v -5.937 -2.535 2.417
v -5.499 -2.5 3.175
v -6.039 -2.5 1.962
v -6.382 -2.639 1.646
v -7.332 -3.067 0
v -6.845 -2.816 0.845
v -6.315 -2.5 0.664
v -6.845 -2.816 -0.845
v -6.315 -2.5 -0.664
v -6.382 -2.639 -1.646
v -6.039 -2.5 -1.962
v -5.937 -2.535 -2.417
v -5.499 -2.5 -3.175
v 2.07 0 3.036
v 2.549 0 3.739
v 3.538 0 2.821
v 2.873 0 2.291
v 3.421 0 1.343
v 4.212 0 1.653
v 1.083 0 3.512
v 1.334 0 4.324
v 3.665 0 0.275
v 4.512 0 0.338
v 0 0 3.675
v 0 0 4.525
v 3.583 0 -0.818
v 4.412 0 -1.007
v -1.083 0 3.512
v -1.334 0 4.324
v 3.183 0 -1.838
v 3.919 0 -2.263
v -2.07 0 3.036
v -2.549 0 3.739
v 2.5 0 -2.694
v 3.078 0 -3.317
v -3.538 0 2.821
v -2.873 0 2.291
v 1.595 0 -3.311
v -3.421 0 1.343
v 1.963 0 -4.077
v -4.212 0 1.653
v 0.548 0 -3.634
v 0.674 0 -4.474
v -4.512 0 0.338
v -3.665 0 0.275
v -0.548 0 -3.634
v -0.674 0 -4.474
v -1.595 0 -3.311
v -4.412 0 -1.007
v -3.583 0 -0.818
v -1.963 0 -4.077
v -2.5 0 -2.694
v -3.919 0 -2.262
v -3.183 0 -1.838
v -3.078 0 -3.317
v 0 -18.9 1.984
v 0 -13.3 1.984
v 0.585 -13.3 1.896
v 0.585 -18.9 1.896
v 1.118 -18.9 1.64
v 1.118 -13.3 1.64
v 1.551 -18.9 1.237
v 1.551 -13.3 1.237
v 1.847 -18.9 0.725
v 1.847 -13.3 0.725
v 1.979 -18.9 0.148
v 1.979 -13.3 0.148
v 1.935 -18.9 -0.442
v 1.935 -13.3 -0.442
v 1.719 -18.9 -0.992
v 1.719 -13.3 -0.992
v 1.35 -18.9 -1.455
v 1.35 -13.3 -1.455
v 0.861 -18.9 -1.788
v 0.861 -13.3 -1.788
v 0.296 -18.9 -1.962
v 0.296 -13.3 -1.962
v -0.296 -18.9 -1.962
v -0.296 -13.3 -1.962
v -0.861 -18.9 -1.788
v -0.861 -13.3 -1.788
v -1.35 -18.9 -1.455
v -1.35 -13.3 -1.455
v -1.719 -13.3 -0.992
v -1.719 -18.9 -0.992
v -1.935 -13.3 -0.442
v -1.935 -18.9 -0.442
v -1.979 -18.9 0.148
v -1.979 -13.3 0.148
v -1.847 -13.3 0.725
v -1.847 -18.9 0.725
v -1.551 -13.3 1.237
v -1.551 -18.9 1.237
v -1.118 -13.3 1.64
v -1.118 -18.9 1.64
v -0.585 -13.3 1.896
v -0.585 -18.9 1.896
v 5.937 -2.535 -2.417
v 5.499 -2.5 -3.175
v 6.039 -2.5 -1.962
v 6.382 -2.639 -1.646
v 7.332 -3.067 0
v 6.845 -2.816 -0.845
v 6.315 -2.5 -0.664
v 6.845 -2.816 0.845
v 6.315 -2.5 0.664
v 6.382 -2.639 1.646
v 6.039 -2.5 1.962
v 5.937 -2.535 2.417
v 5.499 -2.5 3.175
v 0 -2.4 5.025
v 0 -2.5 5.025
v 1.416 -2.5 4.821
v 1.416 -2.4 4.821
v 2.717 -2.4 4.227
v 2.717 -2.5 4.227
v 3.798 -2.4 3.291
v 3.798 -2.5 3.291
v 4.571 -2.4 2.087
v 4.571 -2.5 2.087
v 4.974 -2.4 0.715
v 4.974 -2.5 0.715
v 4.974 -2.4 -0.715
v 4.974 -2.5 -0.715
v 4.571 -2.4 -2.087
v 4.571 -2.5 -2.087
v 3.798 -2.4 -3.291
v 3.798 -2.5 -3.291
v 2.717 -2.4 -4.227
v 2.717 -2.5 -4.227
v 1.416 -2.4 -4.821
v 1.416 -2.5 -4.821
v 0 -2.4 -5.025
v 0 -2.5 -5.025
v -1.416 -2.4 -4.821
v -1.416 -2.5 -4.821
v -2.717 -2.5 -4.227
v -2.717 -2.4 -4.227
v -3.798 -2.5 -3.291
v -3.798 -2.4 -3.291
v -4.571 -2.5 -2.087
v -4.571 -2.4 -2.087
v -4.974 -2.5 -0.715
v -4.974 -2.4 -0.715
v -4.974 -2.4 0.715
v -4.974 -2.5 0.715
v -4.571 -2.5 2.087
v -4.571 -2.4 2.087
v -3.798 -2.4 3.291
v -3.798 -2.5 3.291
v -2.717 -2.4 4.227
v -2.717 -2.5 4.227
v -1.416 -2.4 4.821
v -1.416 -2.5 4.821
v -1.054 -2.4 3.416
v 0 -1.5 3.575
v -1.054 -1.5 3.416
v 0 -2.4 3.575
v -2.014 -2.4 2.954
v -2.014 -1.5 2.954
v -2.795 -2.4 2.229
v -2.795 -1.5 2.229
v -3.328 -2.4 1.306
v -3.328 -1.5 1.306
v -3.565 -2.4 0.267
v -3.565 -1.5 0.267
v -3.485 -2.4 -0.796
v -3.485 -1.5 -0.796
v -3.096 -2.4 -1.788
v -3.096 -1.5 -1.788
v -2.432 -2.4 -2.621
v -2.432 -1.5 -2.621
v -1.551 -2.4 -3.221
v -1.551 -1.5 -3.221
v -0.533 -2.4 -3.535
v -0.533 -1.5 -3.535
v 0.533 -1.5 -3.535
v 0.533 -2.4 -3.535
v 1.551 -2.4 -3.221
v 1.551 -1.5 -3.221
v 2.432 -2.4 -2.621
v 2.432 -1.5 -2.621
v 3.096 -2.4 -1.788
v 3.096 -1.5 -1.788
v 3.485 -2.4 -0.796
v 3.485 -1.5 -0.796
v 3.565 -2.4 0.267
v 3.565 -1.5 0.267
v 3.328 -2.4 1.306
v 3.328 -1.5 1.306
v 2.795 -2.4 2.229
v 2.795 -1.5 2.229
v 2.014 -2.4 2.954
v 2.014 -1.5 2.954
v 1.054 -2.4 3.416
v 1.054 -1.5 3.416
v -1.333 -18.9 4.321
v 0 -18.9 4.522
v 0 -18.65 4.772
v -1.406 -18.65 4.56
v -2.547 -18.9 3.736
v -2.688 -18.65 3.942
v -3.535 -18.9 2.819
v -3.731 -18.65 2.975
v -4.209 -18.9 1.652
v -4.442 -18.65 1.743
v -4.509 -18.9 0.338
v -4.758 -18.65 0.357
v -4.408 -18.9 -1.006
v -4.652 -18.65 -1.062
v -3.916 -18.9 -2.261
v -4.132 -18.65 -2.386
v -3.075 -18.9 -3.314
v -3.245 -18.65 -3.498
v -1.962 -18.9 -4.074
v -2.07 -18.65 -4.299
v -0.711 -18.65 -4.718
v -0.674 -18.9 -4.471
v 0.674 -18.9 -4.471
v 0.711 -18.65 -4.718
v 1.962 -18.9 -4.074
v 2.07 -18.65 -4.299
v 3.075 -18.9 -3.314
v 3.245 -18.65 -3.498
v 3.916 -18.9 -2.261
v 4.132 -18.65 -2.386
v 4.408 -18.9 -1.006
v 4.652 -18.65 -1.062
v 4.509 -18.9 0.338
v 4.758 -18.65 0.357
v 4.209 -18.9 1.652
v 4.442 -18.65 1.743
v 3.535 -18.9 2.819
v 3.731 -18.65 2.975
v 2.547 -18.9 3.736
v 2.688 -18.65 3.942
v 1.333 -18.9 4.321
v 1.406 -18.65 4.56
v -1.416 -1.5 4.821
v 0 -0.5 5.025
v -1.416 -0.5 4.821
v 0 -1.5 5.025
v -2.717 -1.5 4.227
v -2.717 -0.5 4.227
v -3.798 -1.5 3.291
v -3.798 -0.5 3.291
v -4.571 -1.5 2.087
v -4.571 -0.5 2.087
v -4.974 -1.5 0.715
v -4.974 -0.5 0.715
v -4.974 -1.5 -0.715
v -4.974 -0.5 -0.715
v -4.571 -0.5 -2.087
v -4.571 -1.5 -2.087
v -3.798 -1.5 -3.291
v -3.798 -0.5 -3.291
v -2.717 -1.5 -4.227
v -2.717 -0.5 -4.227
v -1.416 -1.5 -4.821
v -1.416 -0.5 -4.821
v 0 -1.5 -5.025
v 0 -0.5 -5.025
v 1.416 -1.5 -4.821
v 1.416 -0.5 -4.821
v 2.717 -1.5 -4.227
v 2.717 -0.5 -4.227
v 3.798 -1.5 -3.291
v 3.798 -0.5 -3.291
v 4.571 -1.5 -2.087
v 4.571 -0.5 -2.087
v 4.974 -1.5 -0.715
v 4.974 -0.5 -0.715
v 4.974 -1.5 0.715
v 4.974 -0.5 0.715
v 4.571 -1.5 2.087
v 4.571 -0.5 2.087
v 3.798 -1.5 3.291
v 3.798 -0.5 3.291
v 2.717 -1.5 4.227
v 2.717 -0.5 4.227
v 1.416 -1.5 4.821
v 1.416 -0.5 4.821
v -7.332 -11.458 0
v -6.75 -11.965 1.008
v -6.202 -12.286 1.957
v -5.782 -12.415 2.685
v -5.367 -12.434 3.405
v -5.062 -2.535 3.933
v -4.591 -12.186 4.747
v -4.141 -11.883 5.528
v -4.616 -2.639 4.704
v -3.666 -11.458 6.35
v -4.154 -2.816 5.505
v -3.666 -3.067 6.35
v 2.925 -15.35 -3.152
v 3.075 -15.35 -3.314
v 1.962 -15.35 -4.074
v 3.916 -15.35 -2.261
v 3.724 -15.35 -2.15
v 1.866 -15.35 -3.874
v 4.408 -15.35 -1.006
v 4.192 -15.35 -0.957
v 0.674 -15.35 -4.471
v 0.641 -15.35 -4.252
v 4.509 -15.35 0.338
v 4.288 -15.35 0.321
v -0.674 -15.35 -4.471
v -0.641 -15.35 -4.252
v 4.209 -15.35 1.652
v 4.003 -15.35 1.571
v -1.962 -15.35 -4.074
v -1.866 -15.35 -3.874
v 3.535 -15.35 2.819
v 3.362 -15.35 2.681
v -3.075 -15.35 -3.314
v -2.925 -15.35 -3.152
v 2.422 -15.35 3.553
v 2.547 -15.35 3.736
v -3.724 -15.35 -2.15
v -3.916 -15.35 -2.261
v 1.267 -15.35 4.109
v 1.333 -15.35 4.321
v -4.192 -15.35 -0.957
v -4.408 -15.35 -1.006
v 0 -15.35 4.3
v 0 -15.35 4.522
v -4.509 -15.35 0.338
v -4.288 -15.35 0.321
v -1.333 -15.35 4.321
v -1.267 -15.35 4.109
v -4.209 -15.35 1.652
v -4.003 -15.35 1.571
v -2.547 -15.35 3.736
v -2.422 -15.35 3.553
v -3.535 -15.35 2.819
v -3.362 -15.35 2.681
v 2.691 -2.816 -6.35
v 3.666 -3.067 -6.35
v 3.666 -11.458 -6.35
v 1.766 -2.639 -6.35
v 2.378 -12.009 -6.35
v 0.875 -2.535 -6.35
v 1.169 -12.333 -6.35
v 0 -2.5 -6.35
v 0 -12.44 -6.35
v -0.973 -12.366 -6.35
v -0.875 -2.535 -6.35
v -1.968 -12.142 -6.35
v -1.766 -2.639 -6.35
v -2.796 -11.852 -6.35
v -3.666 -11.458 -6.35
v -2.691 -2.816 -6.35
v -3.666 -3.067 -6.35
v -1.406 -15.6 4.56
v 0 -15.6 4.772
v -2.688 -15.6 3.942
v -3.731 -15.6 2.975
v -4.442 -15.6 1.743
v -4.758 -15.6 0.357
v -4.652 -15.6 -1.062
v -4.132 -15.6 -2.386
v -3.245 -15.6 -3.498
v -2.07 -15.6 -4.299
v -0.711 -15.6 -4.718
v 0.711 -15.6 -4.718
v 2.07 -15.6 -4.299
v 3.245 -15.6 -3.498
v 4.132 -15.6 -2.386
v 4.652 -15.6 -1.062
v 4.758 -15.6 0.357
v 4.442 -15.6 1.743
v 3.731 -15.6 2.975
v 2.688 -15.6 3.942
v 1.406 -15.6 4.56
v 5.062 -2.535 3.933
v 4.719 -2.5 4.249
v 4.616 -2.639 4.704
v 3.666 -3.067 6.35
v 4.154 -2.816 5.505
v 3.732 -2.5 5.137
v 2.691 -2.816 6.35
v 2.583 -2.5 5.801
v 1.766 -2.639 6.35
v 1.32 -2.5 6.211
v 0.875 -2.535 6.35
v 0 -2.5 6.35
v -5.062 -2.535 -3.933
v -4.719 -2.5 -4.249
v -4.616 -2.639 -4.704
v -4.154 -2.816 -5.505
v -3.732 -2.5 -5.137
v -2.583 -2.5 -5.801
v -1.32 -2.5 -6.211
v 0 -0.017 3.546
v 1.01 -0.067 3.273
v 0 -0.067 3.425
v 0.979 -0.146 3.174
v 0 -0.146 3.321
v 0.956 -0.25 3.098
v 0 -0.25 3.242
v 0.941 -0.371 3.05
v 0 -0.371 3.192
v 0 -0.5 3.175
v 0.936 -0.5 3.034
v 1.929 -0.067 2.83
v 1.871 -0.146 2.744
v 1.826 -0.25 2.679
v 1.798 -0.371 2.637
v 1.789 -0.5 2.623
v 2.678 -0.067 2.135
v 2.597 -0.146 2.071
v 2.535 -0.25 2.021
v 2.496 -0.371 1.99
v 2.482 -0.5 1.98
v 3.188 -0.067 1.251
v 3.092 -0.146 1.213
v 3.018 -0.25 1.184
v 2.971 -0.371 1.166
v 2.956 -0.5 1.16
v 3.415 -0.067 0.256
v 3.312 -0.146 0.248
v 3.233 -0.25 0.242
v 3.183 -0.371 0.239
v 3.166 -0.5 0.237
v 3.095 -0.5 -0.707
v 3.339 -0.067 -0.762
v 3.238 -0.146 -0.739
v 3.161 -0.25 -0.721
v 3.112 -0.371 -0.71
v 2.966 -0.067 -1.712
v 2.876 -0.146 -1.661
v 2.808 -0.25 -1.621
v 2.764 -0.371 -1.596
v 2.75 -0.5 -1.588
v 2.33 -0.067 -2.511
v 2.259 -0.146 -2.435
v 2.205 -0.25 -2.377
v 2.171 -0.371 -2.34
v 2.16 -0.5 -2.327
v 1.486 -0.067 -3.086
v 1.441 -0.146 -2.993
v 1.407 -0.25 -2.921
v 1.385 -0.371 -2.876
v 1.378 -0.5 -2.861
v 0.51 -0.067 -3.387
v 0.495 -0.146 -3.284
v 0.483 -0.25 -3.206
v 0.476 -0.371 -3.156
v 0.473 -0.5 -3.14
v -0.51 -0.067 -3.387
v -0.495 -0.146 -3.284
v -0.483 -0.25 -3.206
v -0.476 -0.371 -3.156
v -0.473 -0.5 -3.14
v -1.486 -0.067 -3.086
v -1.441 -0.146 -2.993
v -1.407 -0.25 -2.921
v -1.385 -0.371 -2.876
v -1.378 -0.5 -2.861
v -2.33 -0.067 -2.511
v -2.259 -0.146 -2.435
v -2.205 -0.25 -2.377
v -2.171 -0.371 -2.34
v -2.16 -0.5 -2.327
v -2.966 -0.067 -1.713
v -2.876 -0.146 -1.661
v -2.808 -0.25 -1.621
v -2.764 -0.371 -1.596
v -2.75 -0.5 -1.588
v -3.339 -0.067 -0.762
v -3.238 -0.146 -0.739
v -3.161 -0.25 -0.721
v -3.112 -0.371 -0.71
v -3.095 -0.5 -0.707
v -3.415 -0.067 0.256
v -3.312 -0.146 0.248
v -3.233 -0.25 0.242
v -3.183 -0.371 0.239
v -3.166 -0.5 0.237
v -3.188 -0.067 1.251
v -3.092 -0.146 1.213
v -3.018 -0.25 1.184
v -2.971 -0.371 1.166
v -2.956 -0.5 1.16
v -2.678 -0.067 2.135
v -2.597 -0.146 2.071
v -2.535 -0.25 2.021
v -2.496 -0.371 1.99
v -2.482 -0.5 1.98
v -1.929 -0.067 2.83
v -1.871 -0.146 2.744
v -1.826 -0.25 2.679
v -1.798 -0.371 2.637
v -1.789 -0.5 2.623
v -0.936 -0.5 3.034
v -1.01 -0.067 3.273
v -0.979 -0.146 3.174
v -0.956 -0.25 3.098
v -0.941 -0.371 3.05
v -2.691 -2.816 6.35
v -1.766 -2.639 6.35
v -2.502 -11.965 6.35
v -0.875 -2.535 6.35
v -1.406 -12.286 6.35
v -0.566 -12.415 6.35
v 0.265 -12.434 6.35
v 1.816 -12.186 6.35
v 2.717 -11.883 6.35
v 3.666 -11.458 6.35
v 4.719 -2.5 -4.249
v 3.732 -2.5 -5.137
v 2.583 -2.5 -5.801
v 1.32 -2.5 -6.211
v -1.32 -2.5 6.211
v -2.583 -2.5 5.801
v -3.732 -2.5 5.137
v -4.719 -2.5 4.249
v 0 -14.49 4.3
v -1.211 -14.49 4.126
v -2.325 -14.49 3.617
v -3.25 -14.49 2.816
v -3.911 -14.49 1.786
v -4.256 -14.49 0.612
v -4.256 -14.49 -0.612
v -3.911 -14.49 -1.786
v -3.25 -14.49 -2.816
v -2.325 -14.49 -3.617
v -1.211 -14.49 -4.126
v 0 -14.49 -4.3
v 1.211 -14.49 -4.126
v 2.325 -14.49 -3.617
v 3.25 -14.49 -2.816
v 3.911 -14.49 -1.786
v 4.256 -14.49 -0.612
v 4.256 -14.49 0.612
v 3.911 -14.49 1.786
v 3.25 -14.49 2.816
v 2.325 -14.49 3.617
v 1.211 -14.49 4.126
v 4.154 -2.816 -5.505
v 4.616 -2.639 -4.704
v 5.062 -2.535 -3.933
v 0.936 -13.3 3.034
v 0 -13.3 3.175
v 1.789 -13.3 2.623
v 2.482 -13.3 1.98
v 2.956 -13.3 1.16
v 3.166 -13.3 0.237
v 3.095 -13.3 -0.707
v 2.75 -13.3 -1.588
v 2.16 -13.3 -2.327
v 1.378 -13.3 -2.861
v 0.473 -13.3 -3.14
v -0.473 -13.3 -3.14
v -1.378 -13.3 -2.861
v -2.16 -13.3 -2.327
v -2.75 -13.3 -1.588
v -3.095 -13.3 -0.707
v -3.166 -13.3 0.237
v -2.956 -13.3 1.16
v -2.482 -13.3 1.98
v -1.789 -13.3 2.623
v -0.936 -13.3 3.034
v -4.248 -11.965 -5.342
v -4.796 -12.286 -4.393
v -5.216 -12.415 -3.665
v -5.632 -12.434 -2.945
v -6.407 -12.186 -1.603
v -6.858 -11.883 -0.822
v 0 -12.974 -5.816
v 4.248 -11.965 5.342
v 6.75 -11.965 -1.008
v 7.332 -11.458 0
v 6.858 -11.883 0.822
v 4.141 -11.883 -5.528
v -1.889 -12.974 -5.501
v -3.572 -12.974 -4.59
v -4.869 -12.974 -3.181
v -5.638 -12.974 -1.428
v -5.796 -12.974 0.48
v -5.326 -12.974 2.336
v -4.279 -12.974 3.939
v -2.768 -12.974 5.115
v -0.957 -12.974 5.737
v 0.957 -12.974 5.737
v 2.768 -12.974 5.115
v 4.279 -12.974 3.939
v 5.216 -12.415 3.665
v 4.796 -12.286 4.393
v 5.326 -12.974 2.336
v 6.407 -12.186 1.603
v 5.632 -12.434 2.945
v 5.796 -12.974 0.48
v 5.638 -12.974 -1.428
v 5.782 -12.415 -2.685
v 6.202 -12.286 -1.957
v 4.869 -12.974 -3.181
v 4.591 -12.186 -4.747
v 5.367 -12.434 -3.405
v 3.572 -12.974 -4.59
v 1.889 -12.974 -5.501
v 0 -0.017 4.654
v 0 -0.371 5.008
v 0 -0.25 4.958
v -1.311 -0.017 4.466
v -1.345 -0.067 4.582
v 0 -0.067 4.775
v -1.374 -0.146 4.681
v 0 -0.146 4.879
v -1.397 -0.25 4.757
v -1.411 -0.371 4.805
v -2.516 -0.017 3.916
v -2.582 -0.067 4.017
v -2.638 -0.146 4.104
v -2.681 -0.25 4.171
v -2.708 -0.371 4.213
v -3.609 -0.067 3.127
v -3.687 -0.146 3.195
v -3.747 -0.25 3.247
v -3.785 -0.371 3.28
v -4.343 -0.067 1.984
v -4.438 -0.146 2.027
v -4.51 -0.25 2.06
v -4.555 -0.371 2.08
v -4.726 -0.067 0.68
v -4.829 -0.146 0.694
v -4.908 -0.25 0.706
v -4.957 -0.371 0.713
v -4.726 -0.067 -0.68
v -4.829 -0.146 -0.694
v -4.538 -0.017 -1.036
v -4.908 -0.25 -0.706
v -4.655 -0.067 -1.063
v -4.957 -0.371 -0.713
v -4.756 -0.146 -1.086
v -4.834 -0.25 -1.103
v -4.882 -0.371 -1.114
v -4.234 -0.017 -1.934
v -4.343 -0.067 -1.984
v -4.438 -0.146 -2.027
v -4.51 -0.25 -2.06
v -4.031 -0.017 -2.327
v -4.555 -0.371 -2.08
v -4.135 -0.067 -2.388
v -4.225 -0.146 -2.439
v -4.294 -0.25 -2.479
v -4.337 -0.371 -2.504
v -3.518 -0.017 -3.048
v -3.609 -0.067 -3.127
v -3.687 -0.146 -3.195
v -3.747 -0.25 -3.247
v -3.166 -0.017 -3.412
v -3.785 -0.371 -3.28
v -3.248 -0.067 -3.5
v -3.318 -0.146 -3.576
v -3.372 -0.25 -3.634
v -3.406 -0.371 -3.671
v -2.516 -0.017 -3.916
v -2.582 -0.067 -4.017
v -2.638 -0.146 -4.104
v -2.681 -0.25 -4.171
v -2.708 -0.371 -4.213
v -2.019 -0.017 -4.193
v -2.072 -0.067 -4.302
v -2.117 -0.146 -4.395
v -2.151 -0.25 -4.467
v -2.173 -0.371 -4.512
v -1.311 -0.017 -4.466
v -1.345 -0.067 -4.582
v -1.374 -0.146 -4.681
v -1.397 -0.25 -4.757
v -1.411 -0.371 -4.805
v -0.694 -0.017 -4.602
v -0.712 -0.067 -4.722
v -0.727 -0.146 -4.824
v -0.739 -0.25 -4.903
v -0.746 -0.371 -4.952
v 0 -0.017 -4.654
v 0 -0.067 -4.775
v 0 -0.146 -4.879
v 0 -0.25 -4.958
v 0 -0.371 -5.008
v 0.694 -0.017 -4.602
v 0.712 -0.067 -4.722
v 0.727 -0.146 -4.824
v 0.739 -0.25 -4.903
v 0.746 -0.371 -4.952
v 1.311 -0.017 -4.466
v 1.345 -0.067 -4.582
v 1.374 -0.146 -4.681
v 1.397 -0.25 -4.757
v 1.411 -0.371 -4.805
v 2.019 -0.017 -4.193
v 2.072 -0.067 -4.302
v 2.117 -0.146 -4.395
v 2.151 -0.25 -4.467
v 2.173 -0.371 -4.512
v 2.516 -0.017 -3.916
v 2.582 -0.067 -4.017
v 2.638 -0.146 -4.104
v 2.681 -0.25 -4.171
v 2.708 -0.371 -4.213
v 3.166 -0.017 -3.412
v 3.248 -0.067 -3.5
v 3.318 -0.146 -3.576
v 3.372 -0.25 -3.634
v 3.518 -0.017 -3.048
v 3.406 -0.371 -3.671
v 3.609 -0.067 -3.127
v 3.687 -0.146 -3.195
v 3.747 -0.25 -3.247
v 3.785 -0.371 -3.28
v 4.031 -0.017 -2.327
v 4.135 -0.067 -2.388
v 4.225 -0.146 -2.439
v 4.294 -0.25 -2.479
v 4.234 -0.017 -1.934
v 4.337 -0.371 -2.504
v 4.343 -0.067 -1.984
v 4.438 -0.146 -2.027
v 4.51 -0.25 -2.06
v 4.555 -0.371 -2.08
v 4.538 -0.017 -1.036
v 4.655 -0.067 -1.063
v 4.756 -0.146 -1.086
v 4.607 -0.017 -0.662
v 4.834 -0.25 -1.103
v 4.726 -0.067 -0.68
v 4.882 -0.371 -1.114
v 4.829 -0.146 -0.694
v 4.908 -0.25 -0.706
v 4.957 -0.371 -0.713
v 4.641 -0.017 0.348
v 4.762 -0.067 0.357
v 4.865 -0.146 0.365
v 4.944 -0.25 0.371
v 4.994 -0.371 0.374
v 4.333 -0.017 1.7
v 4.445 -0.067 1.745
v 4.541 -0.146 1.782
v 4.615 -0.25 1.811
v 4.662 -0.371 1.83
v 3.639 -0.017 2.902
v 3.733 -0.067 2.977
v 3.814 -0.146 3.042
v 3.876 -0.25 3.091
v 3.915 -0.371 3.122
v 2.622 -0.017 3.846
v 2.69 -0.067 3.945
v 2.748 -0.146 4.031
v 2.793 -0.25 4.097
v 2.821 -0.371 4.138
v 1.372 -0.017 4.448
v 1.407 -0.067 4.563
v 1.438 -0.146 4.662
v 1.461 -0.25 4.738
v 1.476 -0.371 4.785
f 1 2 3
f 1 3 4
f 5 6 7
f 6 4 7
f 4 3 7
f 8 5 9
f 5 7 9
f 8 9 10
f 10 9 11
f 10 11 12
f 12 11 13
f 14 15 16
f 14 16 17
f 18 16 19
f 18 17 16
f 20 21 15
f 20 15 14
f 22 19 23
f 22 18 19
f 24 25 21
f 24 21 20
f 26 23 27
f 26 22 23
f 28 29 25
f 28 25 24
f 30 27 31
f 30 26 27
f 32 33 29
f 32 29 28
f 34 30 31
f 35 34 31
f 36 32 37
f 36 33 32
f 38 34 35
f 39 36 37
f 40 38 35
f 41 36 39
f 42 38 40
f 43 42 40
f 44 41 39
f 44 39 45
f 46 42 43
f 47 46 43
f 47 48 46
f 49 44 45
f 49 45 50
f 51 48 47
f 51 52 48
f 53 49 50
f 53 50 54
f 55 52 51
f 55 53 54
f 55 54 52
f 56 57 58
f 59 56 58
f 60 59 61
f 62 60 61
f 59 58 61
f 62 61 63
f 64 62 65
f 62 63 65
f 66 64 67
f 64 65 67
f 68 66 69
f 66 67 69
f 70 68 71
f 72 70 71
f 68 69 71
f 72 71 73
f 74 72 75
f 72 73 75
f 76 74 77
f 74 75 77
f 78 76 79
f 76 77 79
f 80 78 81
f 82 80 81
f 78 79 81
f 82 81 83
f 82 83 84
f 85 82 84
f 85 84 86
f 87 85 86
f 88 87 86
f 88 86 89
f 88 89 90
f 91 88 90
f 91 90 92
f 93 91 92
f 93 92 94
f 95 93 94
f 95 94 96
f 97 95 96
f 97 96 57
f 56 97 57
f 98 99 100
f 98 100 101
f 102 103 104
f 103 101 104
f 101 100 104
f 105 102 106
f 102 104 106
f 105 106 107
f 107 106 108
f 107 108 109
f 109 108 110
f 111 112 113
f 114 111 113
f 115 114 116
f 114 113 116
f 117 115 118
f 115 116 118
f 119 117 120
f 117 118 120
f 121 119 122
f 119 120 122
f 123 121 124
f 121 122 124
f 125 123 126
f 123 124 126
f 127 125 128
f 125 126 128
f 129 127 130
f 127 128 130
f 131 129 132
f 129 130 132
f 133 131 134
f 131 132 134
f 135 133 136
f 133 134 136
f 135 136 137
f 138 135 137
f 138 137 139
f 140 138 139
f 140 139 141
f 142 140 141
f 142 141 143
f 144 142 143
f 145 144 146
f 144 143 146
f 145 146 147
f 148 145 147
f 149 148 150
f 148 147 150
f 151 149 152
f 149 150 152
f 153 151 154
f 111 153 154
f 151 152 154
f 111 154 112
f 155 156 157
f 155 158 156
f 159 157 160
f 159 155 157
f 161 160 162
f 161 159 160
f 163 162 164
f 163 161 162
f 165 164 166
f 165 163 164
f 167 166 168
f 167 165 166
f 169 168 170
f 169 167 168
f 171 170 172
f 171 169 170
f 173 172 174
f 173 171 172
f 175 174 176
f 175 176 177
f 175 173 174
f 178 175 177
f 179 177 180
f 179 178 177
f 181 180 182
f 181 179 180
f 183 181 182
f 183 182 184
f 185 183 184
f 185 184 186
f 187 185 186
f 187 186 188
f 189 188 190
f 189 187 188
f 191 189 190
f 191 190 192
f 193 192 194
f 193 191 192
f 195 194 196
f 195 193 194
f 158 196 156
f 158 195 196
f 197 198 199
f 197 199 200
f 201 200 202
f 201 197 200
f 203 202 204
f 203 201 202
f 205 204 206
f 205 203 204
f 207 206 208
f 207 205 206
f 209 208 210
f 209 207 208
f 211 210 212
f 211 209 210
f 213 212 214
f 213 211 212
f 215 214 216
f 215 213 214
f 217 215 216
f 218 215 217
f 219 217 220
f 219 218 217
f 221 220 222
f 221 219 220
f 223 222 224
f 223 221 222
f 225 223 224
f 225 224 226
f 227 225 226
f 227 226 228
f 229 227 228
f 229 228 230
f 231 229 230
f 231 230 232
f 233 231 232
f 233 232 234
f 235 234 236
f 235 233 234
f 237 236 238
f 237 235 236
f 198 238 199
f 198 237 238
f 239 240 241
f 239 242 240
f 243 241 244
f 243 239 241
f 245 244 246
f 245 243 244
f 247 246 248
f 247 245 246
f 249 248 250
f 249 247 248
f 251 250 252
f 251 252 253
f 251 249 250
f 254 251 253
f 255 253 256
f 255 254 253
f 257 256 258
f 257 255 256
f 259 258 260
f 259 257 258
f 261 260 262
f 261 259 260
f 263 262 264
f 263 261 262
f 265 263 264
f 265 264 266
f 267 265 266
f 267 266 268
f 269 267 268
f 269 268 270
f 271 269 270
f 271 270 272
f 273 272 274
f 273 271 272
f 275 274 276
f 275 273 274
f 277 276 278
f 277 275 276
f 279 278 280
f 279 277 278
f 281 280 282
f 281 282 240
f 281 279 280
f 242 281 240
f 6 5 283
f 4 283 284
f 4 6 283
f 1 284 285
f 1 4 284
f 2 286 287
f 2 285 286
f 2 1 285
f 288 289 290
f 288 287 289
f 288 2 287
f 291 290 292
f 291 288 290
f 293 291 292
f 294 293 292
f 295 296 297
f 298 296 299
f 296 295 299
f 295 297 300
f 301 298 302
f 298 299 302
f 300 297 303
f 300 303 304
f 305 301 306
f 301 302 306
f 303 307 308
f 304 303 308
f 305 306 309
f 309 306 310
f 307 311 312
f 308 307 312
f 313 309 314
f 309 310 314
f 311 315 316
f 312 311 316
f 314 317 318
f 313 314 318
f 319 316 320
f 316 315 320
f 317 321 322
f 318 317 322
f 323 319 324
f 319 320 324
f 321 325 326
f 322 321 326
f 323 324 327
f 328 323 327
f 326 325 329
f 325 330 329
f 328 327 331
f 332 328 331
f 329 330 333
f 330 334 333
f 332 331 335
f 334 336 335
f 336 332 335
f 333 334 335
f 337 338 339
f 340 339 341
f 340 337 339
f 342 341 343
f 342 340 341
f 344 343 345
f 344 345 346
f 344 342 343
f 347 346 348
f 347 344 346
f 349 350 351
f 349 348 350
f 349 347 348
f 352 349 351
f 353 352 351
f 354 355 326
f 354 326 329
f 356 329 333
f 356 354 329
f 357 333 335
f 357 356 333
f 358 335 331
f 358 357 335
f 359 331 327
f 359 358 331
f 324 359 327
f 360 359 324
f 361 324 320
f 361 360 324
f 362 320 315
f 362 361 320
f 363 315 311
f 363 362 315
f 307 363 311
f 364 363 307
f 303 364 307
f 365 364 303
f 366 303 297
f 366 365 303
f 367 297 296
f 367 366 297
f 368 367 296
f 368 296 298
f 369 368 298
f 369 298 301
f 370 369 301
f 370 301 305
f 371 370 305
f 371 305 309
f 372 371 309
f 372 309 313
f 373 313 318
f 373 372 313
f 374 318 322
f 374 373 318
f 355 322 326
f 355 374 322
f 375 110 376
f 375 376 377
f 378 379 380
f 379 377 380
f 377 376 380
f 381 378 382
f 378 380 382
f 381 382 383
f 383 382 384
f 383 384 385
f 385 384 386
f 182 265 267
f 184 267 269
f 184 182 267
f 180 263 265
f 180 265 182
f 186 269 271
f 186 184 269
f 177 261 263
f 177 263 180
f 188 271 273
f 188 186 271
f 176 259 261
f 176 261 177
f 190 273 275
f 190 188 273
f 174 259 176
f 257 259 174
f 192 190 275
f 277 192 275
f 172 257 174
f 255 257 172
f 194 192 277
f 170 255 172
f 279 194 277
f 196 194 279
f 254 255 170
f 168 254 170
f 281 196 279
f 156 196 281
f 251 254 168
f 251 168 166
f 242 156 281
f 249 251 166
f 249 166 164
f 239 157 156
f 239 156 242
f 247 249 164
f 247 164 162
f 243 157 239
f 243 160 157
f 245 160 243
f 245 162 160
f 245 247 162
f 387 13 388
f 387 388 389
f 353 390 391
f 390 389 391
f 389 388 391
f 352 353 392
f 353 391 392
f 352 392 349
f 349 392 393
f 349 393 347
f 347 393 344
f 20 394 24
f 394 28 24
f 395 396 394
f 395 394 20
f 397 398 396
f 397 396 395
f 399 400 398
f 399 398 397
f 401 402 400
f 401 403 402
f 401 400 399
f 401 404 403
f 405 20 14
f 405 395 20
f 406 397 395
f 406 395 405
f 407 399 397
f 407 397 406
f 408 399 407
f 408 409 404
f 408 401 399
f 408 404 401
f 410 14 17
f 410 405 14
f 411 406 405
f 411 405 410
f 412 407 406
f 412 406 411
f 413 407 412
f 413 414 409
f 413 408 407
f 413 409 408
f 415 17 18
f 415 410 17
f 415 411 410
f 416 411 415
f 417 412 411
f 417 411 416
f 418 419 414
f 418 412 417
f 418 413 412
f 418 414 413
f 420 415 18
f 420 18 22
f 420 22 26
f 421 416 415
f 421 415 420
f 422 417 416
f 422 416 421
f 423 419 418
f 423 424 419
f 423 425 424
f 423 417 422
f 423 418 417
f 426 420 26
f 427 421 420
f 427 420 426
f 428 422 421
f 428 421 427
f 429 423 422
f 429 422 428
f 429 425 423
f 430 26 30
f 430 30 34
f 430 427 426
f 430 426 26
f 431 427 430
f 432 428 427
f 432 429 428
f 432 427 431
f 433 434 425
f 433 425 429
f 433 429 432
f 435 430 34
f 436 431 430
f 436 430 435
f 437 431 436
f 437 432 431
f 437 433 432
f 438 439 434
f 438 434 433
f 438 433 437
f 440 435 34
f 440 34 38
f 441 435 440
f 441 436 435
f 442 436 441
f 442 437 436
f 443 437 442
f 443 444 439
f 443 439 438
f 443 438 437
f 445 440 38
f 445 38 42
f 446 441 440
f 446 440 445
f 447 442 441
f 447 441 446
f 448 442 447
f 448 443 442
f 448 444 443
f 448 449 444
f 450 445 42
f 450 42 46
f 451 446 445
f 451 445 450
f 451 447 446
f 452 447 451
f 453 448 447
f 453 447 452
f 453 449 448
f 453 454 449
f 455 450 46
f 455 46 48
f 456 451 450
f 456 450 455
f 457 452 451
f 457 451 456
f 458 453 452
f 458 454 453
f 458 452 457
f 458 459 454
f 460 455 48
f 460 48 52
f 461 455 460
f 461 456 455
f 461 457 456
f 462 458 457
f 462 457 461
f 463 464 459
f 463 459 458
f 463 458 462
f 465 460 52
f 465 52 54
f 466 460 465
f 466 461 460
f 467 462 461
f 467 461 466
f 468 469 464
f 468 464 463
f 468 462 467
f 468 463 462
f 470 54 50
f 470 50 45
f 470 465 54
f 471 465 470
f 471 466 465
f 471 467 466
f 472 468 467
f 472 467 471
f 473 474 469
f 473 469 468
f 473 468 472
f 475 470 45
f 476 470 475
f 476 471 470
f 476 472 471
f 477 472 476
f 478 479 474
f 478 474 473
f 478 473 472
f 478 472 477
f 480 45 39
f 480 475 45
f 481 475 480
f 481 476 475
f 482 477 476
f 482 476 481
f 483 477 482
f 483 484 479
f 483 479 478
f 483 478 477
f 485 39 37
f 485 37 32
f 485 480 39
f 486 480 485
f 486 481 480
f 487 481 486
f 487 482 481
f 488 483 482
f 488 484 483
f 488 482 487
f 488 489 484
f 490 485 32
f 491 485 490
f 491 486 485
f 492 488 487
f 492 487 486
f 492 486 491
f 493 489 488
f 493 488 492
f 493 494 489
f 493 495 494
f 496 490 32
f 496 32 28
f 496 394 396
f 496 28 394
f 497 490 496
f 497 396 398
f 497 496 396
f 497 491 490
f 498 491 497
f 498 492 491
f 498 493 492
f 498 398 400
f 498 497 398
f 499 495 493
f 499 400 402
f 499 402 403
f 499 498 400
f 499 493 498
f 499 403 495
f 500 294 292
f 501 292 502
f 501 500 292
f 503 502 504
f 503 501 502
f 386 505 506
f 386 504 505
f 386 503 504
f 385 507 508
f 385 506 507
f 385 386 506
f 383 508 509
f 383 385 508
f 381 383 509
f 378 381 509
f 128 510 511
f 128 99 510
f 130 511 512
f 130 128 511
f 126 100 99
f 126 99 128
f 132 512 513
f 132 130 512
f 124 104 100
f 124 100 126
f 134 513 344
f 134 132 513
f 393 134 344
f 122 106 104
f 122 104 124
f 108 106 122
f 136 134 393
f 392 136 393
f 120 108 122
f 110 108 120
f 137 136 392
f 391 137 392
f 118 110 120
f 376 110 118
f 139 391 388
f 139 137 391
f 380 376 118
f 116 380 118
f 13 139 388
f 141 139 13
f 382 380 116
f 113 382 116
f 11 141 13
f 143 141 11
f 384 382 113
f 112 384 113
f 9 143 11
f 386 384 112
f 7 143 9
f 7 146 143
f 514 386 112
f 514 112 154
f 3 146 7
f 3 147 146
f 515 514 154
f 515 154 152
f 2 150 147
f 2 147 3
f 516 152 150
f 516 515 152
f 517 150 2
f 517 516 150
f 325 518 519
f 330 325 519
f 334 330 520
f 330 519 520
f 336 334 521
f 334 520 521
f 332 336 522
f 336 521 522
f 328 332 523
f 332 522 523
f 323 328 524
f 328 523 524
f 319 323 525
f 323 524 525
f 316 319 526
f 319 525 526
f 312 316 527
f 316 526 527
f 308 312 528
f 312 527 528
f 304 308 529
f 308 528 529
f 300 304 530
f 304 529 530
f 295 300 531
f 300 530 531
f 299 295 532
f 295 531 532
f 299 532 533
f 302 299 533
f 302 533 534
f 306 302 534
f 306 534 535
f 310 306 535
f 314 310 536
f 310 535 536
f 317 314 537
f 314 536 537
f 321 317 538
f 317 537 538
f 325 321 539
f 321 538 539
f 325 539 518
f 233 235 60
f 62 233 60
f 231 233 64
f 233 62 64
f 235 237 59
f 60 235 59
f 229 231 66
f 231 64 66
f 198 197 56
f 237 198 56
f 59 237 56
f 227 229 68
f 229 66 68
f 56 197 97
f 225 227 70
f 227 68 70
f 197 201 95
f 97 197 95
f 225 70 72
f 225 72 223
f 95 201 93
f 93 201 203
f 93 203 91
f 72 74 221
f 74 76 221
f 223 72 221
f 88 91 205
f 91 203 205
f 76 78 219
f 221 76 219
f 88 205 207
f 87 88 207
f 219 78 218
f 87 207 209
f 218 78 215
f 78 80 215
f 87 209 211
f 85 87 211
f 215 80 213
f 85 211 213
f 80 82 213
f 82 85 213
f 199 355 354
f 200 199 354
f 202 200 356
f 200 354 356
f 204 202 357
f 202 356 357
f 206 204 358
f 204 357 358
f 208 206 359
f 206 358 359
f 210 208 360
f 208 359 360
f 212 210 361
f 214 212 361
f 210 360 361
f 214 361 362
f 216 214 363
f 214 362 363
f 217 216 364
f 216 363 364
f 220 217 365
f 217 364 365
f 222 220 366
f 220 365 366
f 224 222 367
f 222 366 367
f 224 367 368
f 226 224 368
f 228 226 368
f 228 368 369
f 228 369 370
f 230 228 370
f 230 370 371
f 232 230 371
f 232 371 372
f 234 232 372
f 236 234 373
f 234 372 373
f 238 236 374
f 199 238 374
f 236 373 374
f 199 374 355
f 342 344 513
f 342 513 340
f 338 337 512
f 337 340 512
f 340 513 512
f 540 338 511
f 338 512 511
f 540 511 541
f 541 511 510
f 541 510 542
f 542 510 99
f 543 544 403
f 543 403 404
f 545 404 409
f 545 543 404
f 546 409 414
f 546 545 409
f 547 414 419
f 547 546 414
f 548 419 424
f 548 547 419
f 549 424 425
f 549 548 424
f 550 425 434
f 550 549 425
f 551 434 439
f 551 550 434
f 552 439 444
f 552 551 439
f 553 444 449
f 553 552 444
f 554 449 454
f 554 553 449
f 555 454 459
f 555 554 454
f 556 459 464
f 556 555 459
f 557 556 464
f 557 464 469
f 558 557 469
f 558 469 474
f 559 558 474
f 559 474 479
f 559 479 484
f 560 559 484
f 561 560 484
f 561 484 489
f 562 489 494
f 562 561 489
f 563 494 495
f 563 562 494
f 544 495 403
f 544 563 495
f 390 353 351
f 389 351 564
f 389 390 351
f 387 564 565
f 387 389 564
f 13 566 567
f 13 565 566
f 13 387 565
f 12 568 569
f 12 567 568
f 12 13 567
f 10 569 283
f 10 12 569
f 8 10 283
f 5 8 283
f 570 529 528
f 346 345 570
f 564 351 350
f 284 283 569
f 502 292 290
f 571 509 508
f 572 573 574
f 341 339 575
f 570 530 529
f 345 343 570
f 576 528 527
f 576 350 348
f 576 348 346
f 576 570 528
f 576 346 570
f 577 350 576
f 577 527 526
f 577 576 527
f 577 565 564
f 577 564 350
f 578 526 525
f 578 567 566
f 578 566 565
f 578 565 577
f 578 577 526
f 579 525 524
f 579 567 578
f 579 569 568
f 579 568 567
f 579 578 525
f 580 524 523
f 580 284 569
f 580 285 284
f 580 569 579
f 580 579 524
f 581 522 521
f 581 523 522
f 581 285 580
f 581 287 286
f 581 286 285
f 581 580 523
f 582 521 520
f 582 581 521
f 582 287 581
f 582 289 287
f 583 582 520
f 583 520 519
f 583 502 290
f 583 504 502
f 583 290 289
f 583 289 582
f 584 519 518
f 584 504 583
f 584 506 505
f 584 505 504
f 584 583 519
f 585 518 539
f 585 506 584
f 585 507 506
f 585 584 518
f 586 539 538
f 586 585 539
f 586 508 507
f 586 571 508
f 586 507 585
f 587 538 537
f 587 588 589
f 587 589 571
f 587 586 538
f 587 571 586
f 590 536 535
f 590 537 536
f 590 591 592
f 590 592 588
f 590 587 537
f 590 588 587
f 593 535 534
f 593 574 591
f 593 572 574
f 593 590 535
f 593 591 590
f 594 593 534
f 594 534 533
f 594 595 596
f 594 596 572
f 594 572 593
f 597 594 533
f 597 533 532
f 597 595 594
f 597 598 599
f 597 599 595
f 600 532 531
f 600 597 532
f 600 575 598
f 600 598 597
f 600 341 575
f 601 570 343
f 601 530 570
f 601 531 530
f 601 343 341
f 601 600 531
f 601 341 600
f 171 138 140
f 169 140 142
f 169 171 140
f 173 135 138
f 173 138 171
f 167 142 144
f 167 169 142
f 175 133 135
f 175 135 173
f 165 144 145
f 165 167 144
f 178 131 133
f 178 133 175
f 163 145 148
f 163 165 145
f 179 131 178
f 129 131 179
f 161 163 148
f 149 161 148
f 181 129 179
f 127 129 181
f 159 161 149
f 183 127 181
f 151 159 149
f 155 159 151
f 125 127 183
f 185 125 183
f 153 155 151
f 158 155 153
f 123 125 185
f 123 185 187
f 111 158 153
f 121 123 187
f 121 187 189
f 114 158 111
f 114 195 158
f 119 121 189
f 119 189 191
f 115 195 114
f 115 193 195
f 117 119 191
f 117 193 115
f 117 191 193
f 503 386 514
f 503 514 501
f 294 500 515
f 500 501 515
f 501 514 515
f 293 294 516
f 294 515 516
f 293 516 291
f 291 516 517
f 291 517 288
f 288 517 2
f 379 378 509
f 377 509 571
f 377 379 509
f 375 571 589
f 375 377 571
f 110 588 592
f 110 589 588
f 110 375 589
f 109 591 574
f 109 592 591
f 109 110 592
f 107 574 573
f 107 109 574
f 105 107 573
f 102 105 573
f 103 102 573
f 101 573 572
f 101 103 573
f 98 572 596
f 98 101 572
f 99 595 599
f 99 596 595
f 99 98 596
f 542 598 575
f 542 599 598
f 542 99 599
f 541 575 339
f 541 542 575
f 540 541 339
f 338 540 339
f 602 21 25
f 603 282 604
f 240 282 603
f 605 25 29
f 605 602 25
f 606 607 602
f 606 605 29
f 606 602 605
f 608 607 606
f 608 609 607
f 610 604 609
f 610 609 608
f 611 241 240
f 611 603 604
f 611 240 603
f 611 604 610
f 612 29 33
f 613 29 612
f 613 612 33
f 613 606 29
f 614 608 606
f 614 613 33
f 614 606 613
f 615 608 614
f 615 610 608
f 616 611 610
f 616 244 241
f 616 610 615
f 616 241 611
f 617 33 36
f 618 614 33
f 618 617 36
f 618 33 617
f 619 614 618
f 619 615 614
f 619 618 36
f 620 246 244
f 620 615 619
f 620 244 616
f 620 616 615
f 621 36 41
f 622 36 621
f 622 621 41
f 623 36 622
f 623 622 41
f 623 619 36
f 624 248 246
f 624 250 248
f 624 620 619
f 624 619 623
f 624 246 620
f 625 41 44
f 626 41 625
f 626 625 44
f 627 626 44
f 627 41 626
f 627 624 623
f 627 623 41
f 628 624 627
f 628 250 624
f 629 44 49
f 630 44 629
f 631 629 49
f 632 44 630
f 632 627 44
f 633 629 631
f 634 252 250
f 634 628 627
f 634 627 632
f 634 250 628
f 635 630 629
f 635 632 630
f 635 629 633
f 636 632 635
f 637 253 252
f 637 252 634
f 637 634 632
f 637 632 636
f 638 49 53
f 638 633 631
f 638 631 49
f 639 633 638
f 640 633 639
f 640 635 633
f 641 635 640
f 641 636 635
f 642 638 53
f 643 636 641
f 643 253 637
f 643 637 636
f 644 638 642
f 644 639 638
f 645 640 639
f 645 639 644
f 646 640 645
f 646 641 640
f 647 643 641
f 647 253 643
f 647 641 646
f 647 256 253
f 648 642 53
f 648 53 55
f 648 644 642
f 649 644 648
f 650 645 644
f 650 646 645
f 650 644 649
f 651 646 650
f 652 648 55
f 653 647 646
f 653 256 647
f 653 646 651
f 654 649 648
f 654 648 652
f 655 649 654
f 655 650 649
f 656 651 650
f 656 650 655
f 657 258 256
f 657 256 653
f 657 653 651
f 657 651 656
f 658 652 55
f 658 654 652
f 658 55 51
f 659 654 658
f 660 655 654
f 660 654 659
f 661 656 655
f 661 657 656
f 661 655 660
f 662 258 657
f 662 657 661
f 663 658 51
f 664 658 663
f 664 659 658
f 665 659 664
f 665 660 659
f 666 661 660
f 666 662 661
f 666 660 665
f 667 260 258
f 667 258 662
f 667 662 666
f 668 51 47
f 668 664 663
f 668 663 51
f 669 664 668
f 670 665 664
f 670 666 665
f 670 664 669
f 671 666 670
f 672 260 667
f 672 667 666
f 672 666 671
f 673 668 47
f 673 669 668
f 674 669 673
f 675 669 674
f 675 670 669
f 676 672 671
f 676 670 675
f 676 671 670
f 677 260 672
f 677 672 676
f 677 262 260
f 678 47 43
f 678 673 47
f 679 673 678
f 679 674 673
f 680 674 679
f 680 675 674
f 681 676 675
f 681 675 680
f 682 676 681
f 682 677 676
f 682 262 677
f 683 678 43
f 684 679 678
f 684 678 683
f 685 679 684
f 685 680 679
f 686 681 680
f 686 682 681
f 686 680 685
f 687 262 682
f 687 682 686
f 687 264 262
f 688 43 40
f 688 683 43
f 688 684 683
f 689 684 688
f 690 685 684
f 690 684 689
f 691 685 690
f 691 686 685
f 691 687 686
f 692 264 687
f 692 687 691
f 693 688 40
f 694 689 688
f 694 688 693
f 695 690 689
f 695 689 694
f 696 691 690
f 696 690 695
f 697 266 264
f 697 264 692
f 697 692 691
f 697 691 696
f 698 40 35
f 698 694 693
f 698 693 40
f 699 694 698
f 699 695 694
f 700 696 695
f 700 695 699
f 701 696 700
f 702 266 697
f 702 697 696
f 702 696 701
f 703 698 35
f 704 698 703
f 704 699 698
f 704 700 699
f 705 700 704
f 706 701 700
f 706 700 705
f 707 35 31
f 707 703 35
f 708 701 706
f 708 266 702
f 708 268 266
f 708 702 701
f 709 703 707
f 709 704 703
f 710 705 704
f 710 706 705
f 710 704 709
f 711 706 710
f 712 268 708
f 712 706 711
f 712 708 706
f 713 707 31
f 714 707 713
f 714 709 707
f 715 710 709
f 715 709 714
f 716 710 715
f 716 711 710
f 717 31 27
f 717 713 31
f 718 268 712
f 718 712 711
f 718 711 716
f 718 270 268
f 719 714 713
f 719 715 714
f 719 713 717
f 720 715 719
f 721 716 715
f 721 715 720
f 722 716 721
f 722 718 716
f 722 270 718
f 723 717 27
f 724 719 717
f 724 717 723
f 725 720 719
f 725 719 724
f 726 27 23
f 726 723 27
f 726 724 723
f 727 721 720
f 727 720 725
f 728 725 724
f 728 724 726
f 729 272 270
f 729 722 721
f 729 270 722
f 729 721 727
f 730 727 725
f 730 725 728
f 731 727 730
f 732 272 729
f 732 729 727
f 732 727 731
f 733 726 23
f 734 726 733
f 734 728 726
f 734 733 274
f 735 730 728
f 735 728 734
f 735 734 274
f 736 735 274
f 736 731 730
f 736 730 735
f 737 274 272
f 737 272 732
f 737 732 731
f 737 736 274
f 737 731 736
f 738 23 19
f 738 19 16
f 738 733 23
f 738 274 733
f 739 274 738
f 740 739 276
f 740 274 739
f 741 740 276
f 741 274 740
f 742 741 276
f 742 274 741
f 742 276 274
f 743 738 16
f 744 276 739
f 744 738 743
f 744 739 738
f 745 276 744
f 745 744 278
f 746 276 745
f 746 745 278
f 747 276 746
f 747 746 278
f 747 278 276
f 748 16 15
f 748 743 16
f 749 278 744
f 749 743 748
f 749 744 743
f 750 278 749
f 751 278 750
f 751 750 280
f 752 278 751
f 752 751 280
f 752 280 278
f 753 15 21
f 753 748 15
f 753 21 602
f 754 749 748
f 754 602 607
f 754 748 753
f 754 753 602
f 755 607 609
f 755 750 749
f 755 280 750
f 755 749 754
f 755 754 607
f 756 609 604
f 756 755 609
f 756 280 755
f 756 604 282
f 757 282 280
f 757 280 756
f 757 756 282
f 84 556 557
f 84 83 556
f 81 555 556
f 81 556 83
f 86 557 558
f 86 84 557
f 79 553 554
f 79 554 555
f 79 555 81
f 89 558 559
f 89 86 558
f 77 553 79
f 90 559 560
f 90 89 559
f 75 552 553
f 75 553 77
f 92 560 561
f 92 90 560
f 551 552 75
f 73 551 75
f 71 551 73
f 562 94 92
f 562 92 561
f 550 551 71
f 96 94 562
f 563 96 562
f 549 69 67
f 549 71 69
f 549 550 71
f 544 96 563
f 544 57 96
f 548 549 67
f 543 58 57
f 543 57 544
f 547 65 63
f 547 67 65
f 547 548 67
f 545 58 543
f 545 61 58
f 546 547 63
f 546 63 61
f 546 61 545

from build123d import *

# Parameters (mm, degrees)
UBODY_START         = -0.1
UBODY_SKETCH_R      = 5.025
UBODY_DEPTH         = 0.1
NUT_DEPTH           = 11.99
THREAD_CHAMFER_SIZE = 0.25
UTUBE_START         = -13.3
UTUBE_SKETCH_R      = 3.175
UTUBE_DEPTH         = 13.3
UTUBE_RADIUS_R      = 0.5
PORT_SKETCH_R       = 1.984375
PORT_DEPTH          = 22.243724564


with BuildPart() as part:
    # URelease_Sketch → URelease (revolve)
    with BuildSketch(Plane.XY, mode=Mode.PRIVATE) as urelease_sk:
        with BuildLine():
            Line((0, 0), (-4.525, 0))
            ThreePointArc((-4.525, 0), (-4.878553391, -0.146446609), (-5.025, -0.5))
            Line((-5.025, -0.5), (-5.025, -1.5))
            Line((-5.025, -1.5), (-3.575, -1.5))
            Line((-3.575, -1.5), (-3.575, -2.4))
            Line((-3.575, -2.4), (0, -2.4))
            Line((0, -2.4), (0, 0))
        make_face()
    revolve(urelease_sk.sketch.rotate(Axis((0, 0, 0), (0, -1, 0)), 270), axis=Axis((0, 0, 0), (0, -1, 0)))

    # UBody_Sketch → UBody (add)
    with BuildSketch(Plane(origin=(0, -2.4, 0), x_dir=(-1, 0, 0), z_dir=(0, 1, 0)).offset(UBODY_START)):
        with Locations(Location((0, 0, 0), (0, 0, 90))):
            Circle(UBODY_SKETCH_R)
    extrude(amount=UBODY_DEPTH)

    # Nut_Sketch → Nut (add)
    with BuildSketch(Plane(origin=(0, -2.5, 0), x_dir=(-1, 0, 0), z_dir=(0, 1, 0))):
        Polygon((-3.666174209, -6.35), (3.666174209, -6.35), (7.332348419, 0), (3.666174209, 6.35), (-3.666174209, 6.35), (-7.332348419, 0), align=None)
    extrude(amount=-NUT_DEPTH)

    # Nut_Chamfer_Sketch → Nut_Chamfer (revolve, cut)
    with BuildSketch(Plane(origin=(0, 0, 0), x_dir=(0, 0, -1), z_dir=(1, 0, 0))):
        Polygon((-6.35, -2.5), (-9.35, -2.5), (-9.35, -4.232050808), align=None)
        Polygon((-9.35, -12.757949192), (-9.35, -14.49), (-6.35, -14.49), align=None)
    revolve(axis=Axis((0, 0, 0), (0, -1, 0)), mode=Mode.SUBTRACT)

    # Threads_Sketch → Threads (revolve)
    with BuildSketch(Plane.XY, mode=Mode.PRIVATE) as threads_sk:
        Polygon((-4.7715, -15.35), (-4.3, -15.35), (-4.3, -14.49), (0, -14.49), (0, -18.9), (-4.7715, -18.9), align=None)
    revolve(threads_sk.sketch.rotate(Axis((0, 0, 0), (0, -1, 0)), 270), axis=Axis((0, 0, 0), (0, -1, 0)))

    # Thread_Chamfer
    thread_chamfer_edges = [part.edges().sort_by_distance(p)[0] for p in [
        (0, -18.9, -4.7715),
        (0, -15.35, -4.7715),
    ]]
    chamfer(thread_chamfer_edges, length=THREAD_CHAMFER_SIZE)

    # UTube_Sketch → UTube (cut)
    with BuildSketch(Plane(origin=(0, 0, 0), x_dir=(1, 0, 0), z_dir=(0, 1, 0)).offset(UTUBE_START)):
        with Locations(Location((0, 0, 0), (0, 0, 270))):
            Circle(UTUBE_SKETCH_R)
    extrude(amount=UTUBE_DEPTH, mode=Mode.SUBTRACT)

    # UTube_Radius
    utube_radius_edges = [part.edges().sort_by_distance(p)[0] for p in [
        (0, 0, -3.175),
    ]]
    fillet(utube_radius_edges, radius=UTUBE_RADIUS_R)

    # Port_Sketch → Port (cut, through all)
    with BuildSketch(Plane(origin=(0, 0, 0), x_dir=(1, 0, 0), z_dir=(0, 1, 0))):
        with Locations(Location((0, 0, 0), (0, 0, 270))):
            Circle(PORT_SKETCH_R)
    extrude(amount=-PORT_DEPTH, mode=Mode.SUBTRACT)

    # Sketch1 → Cut-Revolve2 (revolve, cut)
    with BuildSketch(Plane.XY, mode=Mode.PRIVATE) as cut_revolve2_sk:
        Polygon((-4.3, -14.49), (-7.332348419, -11.457651581), (-7.332348419, -14.49), align=None)
    revolve(cut_revolve2_sk.sketch.rotate(Axis((0, -18.9, 0), (0, 1, 0)), 270), axis=Axis((0, -18.9, 0), (0, 1, 0)), mode=Mode.SUBTRACT)


solid = part.part
